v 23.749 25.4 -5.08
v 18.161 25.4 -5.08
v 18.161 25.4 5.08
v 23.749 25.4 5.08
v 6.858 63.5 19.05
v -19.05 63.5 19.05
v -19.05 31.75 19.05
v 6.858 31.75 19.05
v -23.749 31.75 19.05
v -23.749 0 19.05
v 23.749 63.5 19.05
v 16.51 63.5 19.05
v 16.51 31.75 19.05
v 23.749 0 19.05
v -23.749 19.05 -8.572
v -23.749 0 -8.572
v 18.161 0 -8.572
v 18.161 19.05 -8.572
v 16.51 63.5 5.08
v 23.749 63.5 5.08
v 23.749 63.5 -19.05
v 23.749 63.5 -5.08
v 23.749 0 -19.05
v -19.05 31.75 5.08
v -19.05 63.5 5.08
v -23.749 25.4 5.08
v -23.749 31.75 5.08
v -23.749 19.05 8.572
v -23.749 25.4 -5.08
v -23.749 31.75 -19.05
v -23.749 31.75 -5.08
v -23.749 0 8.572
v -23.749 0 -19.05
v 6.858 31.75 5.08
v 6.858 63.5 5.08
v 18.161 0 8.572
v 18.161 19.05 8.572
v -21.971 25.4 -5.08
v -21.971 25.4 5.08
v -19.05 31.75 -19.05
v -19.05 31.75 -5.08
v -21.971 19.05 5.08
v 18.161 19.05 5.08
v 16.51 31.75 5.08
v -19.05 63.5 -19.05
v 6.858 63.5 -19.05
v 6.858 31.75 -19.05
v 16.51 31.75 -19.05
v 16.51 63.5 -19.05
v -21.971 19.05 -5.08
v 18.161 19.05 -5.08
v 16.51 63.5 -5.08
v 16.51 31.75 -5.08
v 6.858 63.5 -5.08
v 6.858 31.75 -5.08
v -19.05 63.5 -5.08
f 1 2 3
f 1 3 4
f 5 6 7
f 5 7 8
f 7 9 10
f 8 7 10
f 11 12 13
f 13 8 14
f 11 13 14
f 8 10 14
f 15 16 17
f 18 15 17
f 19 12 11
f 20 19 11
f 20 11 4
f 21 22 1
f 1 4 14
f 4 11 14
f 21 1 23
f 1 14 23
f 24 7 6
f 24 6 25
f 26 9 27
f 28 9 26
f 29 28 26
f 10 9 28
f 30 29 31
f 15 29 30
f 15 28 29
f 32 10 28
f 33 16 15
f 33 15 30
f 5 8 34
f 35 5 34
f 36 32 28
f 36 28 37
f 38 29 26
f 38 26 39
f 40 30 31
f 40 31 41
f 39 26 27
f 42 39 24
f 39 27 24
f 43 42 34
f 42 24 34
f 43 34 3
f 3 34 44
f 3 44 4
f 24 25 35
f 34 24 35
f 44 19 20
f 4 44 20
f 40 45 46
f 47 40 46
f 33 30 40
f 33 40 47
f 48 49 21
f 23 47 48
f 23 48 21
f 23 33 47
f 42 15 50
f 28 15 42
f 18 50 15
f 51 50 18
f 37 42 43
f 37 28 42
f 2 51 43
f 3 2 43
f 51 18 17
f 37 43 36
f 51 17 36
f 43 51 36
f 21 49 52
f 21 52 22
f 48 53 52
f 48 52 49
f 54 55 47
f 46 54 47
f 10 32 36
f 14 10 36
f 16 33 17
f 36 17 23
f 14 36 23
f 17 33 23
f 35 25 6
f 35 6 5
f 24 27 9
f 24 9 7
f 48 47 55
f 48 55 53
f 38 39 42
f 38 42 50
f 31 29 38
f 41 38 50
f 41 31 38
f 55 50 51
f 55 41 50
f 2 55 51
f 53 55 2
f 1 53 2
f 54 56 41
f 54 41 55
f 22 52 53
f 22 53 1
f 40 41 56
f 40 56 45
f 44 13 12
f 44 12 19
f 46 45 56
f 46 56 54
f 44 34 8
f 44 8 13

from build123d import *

# Parameters (mm, degrees)
SKETCH1_W           = 47.498
SKETCH1_H           = 38.1
BOSS_EXTRUDE1_DEPTH = 63.5
SKETCH3_W           = 47.498
SKETCH3_H           = 10.16
CUT_EXTRUDE1_DEPTH  = 38.1
SKETCH4_W           = 41.91
SKETCH4_H           = 17.145
CUT_EXTRUDE2_DEPTH  = 19.05
SKETCH5_W           = 40.132
SKETCH5_H           = 10.16
CUT_EXTRUDE3_DEPTH  = 49.770149692
SKETCH6_W           = 9.652
SKETCH6_H           = 38.1
SKETCH6_W_2         = 4.699
CUT_EXTRUDE4_DEPTH  = 31.75


with BuildPart() as part:
    # Sketch1 → Boss-Extrude1 (new body)
    with BuildSketch(Plane(origin=(0, 0, 0), x_dir=(1, 0, 0), z_dir=(0, 1, 0))):
        Rectangle(SKETCH1_W, SKETCH1_H)
    extrude(amount=BOSS_EXTRUDE1_DEPTH)

    # Sketch3 → Cut-Extrude1 (cut)
    with BuildSketch(Plane(origin=(0, 63.5, 0), x_dir=(1, 0, 0), z_dir=(0, 1, 0))):
        Rectangle(SKETCH3_W, SKETCH3_H)
    extrude(amount=-CUT_EXTRUDE1_DEPTH, mode=Mode.SUBTRACT)

    # Sketch4 → Cut-Extrude2 (cut)
    with BuildSketch(Plane.XZ):
        with Locations((-2.794, 0)):
            Rectangle(SKETCH4_W, SKETCH4_H)
    extrude(amount=-CUT_EXTRUDE2_DEPTH, mode=Mode.SUBTRACT)

    # Sketch5 → Cut-Extrude3 (cut, through all)
    with BuildSketch(Plane(origin=(0, 25.4, 0), x_dir=(1, 0, 0), z_dir=(0, 1, 0))):
        with Locations((-1.905, 0)):
            Rectangle(SKETCH5_W, SKETCH5_H)
    extrude(amount=-CUT_EXTRUDE3_DEPTH, mode=Mode.SUBTRACT)

    # Sketch6 → Cut-Extrude4 (cut)
    with BuildSketch(Plane(origin=(0, 63.5, 0), x_dir=(1, 0, 0), z_dir=(0, 1, 0))):
        with Locations((11.684, 0)):
            Rectangle(SKETCH6_W, SKETCH6_H)
        with Locations((-21.3995, 0)):
            Rectangle(SKETCH6_W_2, SKETCH6_H)
    extrude(amount=-CUT_EXTRUDE4_DEPTH, mode=Mode.SUBTRACT)


solid = part.part
